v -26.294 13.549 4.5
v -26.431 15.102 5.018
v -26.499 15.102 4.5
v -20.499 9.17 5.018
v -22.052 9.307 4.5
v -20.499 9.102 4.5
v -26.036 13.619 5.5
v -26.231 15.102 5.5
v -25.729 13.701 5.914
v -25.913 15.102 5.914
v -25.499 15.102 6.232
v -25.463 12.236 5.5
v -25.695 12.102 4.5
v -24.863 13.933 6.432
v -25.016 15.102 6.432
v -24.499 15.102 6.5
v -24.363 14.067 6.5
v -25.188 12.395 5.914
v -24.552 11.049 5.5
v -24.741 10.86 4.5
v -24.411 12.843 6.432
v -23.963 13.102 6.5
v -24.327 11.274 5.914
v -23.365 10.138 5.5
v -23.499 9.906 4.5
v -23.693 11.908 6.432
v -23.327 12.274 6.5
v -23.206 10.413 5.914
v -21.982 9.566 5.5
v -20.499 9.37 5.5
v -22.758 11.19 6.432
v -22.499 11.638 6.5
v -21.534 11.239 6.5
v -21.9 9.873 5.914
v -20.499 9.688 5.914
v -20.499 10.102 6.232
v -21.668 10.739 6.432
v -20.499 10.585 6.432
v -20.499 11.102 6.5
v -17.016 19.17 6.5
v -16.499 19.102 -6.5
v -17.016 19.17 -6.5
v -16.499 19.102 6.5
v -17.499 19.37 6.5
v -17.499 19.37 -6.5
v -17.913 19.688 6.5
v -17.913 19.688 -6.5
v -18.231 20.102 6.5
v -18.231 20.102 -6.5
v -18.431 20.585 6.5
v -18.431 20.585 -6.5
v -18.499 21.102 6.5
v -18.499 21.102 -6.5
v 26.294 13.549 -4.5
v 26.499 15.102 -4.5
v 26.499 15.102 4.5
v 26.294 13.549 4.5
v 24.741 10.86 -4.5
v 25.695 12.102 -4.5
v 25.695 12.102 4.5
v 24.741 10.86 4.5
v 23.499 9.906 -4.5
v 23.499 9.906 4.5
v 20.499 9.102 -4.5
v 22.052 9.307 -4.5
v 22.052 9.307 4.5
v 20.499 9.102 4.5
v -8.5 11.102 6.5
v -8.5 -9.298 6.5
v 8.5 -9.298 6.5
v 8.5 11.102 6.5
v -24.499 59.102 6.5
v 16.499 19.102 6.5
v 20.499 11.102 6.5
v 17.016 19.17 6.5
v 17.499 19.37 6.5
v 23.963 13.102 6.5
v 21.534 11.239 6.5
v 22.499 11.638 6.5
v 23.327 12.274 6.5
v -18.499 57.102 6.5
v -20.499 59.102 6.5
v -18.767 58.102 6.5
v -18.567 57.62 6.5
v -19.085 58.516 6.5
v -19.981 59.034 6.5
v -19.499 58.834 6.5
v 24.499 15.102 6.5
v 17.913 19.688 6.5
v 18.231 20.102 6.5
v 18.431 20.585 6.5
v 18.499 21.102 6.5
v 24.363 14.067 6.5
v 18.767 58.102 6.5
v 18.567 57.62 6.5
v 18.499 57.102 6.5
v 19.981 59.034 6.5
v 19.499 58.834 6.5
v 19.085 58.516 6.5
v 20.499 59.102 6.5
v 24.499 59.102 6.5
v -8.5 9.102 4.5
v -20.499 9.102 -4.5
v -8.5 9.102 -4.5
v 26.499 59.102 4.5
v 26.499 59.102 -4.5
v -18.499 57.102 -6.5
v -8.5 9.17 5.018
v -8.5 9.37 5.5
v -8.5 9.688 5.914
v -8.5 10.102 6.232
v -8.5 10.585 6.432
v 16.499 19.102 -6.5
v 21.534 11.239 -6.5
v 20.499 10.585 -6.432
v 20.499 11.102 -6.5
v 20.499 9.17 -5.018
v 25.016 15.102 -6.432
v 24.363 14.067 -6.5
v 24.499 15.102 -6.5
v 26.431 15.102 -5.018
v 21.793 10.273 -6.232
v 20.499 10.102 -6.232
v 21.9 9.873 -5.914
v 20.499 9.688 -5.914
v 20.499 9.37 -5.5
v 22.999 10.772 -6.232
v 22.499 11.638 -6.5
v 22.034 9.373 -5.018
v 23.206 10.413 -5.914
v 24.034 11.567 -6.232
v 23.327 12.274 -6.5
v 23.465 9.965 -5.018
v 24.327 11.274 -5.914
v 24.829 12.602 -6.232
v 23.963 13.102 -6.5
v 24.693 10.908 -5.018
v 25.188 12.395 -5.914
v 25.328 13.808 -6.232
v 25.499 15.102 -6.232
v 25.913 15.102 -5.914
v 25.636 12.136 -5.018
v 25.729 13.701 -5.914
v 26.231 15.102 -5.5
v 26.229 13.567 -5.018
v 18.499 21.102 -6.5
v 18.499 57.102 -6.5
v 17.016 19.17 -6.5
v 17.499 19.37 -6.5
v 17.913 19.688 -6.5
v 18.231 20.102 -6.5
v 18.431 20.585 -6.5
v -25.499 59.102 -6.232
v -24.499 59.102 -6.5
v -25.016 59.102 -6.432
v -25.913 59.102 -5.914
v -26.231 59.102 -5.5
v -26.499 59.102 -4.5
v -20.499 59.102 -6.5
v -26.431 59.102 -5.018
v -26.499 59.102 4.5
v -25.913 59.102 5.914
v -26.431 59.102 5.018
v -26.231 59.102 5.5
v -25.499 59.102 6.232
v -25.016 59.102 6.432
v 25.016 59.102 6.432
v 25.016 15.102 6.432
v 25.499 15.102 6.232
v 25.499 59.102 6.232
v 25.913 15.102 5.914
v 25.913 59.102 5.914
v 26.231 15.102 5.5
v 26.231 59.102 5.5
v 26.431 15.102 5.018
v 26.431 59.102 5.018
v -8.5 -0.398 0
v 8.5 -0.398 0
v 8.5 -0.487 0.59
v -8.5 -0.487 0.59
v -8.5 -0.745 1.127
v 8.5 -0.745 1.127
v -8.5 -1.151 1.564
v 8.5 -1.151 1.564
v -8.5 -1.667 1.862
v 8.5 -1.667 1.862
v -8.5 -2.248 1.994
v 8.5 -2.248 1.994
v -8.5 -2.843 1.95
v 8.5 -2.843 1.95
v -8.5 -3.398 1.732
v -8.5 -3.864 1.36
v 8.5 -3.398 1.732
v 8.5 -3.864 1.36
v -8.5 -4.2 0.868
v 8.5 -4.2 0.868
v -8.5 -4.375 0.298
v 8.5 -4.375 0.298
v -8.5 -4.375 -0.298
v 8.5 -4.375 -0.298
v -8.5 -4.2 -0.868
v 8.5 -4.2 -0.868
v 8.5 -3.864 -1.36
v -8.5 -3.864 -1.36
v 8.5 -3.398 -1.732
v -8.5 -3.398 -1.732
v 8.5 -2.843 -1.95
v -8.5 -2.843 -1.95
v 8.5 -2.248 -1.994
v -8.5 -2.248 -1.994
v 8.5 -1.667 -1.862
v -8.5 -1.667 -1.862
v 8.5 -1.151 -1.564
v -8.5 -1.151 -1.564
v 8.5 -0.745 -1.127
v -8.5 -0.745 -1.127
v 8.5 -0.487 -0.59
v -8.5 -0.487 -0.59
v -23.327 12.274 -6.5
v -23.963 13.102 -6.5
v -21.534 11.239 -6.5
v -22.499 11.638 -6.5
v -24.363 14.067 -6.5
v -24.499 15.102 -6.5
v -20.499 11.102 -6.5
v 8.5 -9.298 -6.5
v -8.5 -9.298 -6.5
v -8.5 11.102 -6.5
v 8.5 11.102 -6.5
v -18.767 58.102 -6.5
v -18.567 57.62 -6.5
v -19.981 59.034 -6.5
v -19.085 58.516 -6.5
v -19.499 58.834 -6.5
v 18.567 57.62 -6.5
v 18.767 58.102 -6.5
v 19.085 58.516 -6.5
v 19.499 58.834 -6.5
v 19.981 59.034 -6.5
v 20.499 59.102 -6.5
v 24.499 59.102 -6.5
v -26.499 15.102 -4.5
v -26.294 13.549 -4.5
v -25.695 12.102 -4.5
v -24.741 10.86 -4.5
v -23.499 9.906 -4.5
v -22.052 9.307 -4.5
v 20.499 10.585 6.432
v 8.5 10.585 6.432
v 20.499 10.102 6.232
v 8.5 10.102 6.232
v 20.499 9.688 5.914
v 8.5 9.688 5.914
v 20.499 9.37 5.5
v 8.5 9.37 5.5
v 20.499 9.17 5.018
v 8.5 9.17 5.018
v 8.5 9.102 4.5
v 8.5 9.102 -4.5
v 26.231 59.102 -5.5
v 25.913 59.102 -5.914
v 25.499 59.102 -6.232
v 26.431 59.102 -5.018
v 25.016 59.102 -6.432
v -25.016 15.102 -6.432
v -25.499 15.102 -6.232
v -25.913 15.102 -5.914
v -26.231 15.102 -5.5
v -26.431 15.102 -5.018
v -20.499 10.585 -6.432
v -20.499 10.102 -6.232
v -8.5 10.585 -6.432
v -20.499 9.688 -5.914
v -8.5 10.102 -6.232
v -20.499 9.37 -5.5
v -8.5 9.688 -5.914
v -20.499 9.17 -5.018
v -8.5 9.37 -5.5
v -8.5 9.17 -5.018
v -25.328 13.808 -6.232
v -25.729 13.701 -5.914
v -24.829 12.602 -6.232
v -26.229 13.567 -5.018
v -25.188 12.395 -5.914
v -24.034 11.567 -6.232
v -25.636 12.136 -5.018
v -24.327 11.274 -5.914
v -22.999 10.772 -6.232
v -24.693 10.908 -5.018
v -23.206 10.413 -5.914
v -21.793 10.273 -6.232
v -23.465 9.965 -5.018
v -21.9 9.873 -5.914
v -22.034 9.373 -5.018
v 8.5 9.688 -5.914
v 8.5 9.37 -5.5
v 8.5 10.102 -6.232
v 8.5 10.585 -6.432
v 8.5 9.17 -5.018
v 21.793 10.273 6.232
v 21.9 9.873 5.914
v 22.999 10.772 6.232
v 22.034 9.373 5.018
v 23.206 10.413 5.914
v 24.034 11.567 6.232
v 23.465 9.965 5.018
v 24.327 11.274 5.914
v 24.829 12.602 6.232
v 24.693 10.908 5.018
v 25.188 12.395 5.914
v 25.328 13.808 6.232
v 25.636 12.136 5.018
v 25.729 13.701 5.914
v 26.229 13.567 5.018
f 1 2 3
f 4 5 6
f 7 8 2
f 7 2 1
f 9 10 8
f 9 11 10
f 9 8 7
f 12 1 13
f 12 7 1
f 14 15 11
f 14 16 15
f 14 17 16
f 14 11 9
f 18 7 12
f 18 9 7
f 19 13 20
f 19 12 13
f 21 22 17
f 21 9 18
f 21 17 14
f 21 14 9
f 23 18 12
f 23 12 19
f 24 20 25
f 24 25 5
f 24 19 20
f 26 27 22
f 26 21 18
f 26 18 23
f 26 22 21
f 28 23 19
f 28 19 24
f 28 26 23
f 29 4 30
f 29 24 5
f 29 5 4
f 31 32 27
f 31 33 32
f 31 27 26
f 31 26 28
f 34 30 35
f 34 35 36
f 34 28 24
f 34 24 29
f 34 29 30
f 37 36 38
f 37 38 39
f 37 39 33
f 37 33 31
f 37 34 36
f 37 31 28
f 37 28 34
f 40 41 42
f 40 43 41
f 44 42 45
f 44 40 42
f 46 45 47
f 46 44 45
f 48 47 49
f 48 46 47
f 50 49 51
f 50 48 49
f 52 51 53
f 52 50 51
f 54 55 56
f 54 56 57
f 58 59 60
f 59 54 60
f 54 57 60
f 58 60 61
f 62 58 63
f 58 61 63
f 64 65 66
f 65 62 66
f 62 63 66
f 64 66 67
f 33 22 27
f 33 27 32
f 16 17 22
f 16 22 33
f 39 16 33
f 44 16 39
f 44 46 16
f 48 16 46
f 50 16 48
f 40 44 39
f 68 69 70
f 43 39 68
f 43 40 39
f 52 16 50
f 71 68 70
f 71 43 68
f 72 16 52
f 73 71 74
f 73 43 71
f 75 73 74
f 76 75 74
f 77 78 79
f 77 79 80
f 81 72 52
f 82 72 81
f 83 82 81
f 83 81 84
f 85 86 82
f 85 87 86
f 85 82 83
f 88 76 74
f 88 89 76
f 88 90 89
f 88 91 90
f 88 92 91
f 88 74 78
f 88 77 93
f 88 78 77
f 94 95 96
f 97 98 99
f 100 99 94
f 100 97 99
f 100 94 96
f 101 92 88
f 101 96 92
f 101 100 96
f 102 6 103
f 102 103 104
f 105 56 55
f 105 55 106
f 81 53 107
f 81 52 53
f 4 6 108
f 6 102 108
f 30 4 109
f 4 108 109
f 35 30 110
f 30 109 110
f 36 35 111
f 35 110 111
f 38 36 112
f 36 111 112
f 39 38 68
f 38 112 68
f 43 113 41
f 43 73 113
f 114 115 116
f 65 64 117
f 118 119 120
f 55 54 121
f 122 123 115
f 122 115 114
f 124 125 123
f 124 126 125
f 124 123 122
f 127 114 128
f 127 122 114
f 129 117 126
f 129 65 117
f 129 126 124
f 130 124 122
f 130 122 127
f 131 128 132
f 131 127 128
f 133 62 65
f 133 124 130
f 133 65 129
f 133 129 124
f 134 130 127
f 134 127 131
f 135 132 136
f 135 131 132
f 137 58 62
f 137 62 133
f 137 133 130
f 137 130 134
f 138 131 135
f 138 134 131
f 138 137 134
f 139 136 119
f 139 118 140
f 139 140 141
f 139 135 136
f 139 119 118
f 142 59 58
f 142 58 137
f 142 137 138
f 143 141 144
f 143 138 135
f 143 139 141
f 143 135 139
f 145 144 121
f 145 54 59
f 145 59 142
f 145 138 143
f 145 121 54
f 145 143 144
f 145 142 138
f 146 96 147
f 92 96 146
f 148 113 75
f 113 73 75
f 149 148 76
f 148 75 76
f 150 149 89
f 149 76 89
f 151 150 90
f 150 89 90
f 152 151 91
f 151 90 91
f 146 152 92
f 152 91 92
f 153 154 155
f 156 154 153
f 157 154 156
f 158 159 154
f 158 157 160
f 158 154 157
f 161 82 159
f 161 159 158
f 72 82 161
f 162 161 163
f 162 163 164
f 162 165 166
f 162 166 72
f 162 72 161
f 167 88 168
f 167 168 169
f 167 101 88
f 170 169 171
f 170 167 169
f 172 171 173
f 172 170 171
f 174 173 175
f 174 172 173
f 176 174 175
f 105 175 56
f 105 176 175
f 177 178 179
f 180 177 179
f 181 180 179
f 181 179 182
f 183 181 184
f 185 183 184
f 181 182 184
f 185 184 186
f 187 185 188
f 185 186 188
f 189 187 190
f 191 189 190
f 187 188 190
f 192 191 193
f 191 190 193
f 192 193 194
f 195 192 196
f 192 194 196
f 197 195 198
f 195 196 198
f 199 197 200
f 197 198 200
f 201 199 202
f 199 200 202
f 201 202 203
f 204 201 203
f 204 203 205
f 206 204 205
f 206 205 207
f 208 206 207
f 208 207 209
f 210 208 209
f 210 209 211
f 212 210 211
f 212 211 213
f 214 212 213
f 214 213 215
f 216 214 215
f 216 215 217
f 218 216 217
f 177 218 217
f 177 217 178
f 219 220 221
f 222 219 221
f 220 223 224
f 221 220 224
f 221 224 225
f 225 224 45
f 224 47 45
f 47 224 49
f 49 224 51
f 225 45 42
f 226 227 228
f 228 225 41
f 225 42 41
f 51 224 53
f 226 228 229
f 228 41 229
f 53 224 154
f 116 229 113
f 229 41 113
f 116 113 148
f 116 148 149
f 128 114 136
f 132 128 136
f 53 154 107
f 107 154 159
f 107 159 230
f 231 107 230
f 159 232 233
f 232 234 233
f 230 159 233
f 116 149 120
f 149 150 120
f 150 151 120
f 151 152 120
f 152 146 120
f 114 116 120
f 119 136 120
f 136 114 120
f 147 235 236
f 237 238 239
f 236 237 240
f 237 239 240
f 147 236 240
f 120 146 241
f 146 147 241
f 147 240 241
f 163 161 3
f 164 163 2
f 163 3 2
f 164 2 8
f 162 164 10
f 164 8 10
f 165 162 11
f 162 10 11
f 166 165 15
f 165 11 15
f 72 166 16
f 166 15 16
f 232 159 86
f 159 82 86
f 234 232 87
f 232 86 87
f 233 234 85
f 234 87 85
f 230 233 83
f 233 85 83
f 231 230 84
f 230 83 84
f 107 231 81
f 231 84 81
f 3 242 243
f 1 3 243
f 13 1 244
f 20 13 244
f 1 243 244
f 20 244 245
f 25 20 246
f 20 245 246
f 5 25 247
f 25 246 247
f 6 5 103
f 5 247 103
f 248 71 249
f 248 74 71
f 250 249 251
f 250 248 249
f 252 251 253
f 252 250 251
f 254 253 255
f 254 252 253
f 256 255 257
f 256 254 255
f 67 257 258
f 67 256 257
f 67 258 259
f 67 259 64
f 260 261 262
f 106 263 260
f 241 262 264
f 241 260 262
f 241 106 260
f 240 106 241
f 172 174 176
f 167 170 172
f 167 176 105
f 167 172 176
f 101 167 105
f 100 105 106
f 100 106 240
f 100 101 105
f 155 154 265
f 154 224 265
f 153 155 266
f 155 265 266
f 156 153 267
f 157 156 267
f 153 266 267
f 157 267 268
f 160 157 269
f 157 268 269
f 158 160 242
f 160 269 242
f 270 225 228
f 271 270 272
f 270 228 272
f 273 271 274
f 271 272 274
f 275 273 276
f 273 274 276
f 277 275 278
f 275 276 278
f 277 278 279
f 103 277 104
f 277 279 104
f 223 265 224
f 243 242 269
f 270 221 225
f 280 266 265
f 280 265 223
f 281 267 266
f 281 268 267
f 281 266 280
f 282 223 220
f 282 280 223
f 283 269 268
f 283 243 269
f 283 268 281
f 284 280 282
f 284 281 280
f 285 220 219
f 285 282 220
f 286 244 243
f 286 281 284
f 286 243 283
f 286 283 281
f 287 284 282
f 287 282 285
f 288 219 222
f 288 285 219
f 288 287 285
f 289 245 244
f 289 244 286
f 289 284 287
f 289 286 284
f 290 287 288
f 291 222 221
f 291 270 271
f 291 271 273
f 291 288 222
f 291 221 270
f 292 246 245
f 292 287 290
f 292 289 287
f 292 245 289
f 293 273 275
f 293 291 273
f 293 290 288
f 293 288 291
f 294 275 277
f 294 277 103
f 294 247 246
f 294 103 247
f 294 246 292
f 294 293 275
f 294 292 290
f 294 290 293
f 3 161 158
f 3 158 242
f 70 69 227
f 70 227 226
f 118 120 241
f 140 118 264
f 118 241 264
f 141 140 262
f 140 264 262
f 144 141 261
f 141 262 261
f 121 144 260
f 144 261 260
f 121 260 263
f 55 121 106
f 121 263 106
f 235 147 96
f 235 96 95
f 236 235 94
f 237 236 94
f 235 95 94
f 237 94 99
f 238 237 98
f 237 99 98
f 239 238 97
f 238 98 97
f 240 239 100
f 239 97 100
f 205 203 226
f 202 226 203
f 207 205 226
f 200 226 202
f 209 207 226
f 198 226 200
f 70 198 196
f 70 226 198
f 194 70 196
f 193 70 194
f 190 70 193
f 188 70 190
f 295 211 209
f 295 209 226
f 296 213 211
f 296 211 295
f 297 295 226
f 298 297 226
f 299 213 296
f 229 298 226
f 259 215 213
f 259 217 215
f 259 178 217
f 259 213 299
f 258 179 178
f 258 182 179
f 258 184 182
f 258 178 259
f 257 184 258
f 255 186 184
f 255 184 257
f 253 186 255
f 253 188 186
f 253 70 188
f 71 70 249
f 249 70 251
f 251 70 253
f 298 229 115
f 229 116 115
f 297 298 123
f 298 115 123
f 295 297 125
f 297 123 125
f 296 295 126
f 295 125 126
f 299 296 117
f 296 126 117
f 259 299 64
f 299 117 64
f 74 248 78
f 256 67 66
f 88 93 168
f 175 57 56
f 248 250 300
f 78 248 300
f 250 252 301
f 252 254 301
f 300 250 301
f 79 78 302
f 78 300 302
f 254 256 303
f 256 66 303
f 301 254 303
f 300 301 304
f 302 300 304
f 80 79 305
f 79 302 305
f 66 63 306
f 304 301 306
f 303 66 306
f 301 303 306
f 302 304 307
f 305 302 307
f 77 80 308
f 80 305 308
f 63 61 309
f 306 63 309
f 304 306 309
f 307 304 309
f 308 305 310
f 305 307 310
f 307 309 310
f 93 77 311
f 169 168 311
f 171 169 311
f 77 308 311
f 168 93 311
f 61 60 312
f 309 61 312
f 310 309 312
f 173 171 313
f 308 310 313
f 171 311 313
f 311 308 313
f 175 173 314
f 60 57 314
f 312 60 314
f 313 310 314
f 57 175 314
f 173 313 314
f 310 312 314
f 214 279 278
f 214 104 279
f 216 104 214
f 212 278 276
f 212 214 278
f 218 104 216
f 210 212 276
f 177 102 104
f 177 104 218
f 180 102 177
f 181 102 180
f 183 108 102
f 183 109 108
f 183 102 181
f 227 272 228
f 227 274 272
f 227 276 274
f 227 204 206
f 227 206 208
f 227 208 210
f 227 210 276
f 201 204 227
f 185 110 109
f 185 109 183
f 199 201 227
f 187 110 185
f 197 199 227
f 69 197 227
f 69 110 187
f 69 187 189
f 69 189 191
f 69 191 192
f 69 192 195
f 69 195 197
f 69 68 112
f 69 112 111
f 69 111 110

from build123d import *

# Parameters (mm, degrees)
PAD_DEPTH    = 6.5
SKETCH001_R  = 2
POCKET_DEPTH = 34.999843
FILLET_R     = 2
FILLET001_R  = 2
FILLET002_R  = 6
FILLET003_R  = 2
FILLET004_R  = 2
FILLET005_R  = 2


with BuildPart() as part:
    # Sketch → Pad (new body, symmetric)
    with BuildSketch(Plane.XY):
        Polygon((-8.5, 9.102282), (-8.5, -9.297718), (8.5, -9.297718), (8.5, 9.102282), (26.498843, 9.102282), (26.498843, 59.102282), (18.498843, 59.102282), (18.498843, 19.102282), (-18.498843, 19.102282), (-18.498843, 59.102282), (-26.498843, 59.102282), (-26.498843, 9.102282), align=None)
    extrude(amount=PAD_DEPTH, both=True)

    # Sketch001 → Pocket (cut, through all)
    with BuildSketch(Plane.YZ.offset(8.5)):
        with Locations((-2.397718, 0)):
            Circle(SKETCH001_R)
    extrude(amount=-POCKET_DEPTH, mode=Mode.SUBTRACT)

    # Fillet
    fillet_edges = [part.edges().sort_by_distance(p)[0] for p in [
        (-18.498843, 19.102282, 0),
    ]]
    fillet(fillet_edges, radius=FILLET_R)

    # Fillet001
    fillet001_edges = [part.edges().sort_by_distance(p)[0] for p in [
        (18.498843, 19.102282, 0),
    ]]
    fillet(fillet001_edges, radius=FILLET001_R)

    # Fillet002
    fillet002_edges = [part.edges().sort_by_distance(p)[0] for p in [
        (26.498843, 9.102282, 0),
        (-26.498843, 9.102282, 0),
    ]]
    fillet(fillet002_edges, radius=FILLET002_R)

    # Fillet003
    fillet003_edges = [part.edges().sort_by_distance(p)[0] for p in [
        (-24.741484, 10.859642, 6.5),
        (-26.498843, 37.102282, 6.5),
        (-14.499422, 9.102282, 6.5),
        (-14.499422, 9.102282, -6.5),
        (-24.741484, 10.859642, -6.5),
        (-26.498843, 37.102282, -6.5),
    ]]
    fillet(fillet003_edges, radius=FILLET003_R)

    # Fillet004
    fillet004_edges = [part.edges().sort_by_distance(p)[0] for p in [
        (14.499422, 9.102282, 6.5),
        (24.741484, 10.859642, 6.5),
        (26.498843, 37.102282, 6.5),
        (26.498843, 37.102282, -6.5),
        (24.741484, 10.859642, -6.5),
        (14.499422, 9.102282, -6.5),
    ]]
    fillet(fillet004_edges, radius=FILLET004_R)

    # Fillet005
    fillet005_edges = [part.edges().sort_by_distance(p)[0] for p in [
        (18.498843, 59.102282, 0),
        (-18.498843, 59.102282, 0),
    ]]
    fillet(fillet005_edges, radius=FILLET005_R)


solid = part.part
